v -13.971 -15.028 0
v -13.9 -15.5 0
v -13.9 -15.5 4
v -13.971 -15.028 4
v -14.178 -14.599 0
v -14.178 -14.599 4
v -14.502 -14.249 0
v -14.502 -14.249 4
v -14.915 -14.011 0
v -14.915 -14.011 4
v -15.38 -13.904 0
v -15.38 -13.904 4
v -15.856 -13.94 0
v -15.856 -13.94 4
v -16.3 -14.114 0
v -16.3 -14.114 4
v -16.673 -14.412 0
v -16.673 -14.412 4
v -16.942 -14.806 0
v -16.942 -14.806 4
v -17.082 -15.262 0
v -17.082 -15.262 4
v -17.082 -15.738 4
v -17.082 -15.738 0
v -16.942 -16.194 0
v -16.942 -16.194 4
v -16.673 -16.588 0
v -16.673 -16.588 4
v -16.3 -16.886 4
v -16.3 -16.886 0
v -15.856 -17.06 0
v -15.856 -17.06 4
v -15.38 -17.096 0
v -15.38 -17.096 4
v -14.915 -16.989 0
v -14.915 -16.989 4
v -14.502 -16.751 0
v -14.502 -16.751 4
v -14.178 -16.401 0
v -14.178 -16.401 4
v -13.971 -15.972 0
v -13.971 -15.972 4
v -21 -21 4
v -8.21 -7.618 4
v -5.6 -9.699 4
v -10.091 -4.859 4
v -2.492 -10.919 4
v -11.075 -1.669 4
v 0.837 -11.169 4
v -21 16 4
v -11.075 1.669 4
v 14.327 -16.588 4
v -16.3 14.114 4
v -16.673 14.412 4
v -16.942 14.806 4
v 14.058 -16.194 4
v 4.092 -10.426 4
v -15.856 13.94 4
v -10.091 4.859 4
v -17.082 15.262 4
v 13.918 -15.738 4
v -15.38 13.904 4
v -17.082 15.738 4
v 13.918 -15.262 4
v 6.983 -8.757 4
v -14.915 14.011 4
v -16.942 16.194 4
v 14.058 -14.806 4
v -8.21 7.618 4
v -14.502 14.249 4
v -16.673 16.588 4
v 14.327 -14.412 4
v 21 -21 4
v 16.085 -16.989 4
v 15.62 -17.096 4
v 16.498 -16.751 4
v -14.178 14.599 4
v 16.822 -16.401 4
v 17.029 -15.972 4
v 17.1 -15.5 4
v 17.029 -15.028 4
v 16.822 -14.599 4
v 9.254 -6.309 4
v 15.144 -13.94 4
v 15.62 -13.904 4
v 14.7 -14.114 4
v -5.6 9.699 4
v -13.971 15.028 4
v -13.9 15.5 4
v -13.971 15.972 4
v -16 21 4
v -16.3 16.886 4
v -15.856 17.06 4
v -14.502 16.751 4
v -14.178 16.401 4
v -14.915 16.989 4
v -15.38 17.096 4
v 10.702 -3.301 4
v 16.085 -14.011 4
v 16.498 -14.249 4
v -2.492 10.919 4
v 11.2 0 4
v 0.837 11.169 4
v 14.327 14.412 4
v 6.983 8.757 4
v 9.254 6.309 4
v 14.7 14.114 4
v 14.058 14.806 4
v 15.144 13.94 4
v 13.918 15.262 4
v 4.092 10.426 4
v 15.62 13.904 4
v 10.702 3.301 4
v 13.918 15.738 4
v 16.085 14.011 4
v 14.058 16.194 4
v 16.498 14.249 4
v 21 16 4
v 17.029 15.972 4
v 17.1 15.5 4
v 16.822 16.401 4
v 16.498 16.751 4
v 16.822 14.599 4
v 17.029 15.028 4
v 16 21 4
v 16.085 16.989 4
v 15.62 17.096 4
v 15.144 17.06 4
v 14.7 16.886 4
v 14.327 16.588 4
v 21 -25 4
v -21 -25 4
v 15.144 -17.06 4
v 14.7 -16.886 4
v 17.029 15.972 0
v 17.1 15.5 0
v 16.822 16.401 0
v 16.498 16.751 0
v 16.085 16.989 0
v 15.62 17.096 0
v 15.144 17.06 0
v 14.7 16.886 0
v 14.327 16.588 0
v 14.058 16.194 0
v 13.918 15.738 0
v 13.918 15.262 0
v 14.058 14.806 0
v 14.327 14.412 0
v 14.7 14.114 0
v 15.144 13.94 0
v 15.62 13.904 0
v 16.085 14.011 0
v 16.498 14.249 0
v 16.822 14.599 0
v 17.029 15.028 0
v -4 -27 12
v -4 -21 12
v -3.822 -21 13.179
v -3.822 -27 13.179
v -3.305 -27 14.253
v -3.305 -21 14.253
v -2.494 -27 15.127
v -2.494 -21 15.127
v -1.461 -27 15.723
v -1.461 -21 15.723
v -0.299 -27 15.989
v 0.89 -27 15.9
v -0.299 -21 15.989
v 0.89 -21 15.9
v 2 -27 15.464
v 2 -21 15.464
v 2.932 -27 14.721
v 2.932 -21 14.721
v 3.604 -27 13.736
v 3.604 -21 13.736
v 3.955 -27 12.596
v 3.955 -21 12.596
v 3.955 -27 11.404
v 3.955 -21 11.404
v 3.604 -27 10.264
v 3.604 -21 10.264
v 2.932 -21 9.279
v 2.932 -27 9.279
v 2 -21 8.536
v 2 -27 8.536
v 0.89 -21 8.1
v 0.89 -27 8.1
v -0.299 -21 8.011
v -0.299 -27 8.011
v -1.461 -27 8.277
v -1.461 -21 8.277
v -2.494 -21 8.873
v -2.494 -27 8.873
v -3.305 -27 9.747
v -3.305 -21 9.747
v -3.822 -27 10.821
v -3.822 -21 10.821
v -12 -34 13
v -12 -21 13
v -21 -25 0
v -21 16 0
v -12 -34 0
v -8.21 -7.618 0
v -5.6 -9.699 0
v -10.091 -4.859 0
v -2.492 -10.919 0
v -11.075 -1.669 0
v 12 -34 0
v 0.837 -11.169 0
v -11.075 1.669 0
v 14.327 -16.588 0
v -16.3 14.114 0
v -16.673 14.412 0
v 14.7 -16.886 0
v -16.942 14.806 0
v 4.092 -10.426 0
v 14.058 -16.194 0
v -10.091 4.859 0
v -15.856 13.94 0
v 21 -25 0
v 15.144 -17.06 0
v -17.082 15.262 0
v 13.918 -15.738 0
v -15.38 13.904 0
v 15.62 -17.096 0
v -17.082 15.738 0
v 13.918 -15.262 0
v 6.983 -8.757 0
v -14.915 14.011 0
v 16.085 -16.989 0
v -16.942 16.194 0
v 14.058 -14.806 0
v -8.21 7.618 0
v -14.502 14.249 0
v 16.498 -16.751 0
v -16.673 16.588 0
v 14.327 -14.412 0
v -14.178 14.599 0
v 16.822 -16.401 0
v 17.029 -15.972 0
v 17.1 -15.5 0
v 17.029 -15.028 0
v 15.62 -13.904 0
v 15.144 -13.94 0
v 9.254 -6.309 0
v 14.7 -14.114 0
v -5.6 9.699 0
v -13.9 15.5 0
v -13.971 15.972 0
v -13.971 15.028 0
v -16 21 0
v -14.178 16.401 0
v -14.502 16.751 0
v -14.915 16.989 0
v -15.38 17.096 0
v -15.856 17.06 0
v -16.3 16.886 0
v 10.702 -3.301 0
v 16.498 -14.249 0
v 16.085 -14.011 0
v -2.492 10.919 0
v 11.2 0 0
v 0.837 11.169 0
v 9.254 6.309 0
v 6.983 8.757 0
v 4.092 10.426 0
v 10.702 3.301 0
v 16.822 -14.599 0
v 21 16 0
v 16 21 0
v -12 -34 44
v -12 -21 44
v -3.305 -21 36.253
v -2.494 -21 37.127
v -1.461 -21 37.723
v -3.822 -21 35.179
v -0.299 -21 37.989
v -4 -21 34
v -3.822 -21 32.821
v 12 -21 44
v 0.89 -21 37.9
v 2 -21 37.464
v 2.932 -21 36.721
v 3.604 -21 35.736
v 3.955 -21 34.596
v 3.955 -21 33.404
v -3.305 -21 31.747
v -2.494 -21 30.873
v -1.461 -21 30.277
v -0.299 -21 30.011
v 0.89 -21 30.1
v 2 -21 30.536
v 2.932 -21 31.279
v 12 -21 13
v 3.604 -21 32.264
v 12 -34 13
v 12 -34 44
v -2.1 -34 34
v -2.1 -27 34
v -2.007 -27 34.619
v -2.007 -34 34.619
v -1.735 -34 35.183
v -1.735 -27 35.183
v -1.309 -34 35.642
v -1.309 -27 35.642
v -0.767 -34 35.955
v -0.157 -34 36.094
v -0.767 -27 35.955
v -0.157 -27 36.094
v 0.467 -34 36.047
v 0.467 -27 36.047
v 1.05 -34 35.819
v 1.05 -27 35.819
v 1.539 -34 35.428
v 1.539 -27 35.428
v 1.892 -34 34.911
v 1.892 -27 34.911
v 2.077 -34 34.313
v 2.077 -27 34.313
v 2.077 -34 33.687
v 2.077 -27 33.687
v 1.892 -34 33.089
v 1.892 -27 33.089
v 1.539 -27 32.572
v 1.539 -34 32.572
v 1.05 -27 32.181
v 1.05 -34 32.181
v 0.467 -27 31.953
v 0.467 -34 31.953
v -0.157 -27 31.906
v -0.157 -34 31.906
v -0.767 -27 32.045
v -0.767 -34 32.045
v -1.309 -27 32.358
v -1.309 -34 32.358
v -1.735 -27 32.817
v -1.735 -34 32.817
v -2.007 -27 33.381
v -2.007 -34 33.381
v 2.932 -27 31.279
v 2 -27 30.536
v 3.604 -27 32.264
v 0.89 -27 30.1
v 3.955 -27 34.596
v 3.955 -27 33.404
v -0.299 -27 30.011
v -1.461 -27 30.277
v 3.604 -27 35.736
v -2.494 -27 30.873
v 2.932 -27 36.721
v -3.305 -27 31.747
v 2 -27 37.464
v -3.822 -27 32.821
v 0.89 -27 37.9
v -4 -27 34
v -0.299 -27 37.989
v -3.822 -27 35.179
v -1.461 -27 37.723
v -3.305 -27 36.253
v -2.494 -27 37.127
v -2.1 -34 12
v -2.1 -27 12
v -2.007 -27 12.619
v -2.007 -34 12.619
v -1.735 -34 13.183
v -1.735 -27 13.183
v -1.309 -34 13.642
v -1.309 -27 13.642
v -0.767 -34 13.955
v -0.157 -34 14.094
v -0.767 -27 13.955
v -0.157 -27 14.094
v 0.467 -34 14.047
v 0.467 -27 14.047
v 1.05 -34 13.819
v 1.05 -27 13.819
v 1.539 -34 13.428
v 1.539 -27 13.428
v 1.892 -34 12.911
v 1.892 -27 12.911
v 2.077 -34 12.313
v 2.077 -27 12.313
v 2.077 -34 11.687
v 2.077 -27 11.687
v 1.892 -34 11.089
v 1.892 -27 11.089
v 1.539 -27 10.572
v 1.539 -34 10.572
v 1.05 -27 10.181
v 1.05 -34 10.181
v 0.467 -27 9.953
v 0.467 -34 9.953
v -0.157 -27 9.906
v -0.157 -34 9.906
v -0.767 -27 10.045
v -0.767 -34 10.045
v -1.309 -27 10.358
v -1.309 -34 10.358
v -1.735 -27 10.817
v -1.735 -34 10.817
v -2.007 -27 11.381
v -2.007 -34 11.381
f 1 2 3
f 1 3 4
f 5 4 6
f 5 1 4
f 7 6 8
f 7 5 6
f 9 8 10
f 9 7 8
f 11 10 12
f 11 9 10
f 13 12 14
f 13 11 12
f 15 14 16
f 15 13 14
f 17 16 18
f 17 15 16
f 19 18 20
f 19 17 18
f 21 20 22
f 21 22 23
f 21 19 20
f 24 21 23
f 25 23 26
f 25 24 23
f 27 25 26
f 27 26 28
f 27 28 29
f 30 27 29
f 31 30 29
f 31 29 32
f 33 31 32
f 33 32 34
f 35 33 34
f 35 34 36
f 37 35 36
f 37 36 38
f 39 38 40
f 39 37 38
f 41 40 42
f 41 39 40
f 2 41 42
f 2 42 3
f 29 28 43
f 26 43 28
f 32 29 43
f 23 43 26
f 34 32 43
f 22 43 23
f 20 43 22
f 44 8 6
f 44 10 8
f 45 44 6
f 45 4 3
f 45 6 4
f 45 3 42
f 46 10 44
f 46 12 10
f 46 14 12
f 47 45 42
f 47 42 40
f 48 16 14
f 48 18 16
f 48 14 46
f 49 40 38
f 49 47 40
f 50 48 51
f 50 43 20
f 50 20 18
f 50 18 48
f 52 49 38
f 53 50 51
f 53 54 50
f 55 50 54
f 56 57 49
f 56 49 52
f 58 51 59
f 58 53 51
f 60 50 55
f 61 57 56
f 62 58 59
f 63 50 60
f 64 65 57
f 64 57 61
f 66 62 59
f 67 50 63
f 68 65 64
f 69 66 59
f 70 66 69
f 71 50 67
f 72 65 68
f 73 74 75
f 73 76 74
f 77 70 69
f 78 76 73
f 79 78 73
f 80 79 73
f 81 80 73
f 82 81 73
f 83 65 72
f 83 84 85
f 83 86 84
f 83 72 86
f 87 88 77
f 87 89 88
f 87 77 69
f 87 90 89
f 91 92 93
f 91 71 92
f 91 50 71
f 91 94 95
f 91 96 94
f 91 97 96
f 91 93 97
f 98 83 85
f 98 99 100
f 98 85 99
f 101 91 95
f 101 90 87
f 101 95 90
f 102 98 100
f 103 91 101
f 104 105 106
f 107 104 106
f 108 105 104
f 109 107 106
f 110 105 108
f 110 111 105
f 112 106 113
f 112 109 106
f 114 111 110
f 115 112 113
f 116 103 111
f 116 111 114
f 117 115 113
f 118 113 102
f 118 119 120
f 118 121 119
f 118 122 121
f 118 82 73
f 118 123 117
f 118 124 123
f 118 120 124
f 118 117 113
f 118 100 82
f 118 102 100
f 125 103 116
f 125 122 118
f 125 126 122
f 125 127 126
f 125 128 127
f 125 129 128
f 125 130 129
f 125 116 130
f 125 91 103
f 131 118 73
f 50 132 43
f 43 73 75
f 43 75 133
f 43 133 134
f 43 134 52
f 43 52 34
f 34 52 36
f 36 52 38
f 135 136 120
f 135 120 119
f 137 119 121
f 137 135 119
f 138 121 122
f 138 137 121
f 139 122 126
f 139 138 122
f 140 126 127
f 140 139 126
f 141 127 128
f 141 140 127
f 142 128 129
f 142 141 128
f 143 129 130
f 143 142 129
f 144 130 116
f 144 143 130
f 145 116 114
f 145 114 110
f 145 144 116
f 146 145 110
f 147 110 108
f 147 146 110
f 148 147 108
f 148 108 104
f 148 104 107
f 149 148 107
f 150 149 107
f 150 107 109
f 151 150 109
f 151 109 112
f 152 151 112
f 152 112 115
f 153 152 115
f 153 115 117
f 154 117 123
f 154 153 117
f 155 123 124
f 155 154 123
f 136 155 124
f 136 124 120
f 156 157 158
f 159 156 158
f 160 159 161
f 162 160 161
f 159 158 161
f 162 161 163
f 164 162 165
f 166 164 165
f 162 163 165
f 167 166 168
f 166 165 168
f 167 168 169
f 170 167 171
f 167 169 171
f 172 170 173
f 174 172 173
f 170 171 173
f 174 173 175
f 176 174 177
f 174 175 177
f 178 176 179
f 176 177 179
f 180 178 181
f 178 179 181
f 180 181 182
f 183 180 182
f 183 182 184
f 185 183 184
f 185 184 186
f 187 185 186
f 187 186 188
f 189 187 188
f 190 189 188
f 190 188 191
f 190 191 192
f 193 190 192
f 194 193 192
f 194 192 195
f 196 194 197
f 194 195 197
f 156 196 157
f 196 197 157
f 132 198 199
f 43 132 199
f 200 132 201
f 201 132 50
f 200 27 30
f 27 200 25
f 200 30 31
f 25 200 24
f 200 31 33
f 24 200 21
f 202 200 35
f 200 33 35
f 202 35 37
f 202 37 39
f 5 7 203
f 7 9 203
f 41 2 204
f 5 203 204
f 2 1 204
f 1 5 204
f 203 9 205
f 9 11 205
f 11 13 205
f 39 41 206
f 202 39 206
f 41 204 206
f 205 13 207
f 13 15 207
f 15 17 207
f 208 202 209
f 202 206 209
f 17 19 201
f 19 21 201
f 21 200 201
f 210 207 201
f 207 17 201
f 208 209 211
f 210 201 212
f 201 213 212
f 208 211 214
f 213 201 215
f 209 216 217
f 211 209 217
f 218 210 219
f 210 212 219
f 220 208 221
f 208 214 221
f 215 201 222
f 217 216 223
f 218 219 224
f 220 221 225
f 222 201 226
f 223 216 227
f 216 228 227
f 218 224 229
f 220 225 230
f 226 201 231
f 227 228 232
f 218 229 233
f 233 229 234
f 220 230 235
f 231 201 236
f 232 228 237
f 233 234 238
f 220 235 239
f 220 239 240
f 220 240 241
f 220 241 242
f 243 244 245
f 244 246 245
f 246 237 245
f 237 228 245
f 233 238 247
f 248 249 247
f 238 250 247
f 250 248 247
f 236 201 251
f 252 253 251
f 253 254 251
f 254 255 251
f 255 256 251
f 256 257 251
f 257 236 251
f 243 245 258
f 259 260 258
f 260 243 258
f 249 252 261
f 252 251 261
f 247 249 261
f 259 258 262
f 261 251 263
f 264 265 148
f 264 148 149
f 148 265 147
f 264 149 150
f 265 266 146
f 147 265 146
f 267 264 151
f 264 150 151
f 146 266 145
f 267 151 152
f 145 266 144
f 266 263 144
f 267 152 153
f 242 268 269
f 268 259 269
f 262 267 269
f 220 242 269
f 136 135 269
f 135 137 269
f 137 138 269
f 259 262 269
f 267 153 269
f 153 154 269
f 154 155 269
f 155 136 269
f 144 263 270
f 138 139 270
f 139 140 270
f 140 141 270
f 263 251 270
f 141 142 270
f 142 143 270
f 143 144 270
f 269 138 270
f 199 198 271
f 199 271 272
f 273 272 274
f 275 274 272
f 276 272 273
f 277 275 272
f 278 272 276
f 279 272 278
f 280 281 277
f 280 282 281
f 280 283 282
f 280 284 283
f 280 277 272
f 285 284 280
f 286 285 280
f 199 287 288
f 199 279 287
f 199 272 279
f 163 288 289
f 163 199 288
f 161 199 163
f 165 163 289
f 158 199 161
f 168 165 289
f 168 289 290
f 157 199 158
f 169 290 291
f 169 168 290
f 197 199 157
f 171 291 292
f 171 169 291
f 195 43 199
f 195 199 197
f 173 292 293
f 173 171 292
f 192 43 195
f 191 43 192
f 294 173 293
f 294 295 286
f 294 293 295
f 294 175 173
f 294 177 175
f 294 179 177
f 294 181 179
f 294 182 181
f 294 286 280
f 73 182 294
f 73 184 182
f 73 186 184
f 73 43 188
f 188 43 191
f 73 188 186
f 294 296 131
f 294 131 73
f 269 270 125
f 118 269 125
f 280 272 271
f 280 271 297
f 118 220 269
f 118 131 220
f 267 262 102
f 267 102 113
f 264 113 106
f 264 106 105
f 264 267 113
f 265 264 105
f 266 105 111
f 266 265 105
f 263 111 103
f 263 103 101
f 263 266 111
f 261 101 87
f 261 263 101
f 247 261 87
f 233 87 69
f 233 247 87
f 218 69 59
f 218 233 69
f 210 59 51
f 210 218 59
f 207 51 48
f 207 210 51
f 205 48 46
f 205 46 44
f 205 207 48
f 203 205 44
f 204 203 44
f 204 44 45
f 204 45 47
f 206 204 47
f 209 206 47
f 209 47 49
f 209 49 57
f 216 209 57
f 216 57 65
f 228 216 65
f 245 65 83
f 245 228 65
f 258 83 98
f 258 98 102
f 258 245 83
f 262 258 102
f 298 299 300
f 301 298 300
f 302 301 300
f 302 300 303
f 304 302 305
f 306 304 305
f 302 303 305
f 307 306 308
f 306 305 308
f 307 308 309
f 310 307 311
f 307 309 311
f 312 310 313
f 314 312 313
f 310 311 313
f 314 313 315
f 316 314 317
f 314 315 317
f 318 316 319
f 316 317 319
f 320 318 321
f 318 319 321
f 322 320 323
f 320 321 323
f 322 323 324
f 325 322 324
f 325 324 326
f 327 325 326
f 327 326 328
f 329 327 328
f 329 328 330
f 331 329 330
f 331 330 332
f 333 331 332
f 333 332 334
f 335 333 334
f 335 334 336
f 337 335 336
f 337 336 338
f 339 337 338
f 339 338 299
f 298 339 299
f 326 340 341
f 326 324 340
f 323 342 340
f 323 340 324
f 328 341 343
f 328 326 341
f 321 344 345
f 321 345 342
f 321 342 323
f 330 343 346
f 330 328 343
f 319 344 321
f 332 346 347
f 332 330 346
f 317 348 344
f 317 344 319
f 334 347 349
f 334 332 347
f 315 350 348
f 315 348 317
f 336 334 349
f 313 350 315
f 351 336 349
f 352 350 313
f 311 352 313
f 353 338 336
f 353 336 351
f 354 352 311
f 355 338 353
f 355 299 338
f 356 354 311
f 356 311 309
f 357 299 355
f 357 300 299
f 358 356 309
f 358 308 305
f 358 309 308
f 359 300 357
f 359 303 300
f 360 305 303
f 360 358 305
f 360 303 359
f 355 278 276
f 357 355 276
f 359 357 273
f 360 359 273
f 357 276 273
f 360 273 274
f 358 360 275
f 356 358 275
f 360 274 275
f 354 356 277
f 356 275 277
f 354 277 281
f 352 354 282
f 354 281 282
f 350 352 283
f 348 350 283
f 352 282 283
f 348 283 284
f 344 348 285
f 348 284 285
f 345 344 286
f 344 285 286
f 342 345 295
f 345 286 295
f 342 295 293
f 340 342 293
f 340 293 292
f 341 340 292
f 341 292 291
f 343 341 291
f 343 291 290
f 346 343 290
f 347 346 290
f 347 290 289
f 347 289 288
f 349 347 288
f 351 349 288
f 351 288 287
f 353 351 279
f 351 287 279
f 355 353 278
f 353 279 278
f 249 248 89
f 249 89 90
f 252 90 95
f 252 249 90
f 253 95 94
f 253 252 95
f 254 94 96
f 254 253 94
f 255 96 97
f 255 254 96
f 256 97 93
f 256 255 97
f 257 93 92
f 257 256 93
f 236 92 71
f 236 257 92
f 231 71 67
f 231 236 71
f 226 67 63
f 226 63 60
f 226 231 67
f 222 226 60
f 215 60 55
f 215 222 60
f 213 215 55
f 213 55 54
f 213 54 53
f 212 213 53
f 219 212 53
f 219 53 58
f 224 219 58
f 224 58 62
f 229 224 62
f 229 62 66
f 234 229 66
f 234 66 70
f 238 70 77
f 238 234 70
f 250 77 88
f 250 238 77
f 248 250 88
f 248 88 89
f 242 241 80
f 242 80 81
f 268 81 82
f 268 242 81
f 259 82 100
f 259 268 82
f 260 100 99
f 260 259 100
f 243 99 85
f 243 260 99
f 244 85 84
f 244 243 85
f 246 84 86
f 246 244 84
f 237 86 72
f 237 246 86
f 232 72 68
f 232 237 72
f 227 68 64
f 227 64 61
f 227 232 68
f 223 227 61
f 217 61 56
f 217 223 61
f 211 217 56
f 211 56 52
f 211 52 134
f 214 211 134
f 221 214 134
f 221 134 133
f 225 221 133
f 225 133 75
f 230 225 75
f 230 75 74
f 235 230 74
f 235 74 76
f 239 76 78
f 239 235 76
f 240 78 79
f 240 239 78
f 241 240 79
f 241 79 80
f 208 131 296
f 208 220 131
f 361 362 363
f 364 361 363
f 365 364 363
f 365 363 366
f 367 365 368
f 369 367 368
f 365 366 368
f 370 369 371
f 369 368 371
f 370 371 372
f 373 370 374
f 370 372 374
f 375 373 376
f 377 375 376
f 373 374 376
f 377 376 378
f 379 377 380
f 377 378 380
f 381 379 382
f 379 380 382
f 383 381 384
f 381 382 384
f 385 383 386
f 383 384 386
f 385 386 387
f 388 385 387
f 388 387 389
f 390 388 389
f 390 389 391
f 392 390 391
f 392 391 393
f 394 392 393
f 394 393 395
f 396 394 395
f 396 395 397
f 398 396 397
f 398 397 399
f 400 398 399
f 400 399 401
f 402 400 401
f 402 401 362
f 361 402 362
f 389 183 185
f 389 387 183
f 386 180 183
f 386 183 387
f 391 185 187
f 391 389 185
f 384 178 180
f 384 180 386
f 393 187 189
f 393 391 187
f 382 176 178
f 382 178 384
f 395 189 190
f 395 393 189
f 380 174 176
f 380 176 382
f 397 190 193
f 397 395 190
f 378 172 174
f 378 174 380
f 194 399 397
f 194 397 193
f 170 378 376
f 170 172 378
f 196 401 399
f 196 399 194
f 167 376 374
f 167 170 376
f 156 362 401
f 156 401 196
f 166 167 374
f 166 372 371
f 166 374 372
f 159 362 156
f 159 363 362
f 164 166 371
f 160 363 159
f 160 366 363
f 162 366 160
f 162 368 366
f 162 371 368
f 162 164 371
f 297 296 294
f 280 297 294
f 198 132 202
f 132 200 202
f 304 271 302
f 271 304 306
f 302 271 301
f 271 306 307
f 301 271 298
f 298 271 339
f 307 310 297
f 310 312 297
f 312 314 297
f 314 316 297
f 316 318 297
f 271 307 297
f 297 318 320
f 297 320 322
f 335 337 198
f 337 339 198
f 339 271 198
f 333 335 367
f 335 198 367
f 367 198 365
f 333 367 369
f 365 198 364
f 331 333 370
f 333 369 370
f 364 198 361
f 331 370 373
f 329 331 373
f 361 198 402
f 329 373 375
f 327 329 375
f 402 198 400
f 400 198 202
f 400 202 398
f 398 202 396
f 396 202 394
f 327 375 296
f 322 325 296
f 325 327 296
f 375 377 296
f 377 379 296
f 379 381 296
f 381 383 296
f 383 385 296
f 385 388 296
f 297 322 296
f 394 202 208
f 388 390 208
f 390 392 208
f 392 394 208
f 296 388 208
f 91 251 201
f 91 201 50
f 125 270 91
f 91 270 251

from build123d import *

# Parameters (mm, degrees)
F0_R        = 1.6
F0_R_2      = 11.2
F0_W        = 24
F0_H        = 13
F1_DEPTH    = 4
F2_W        = 24
F2_H        = 13
F3_DEPTH    = 40
F4_T4_DEPTH = 4
F4_T9_DEPTH = 4
F5_SIZE     = 8.99999
F6_R        = 2.1
F7_DEPTH    = 25
F6_R_2      = 4
F8_DEPTH    = 6
F9_SIZE     = 5


# Not quite as in the source:
# - a fillet or chamfer that OpenCascade refuses, or shapes differently, is made with other operations: its cross-section is extruded or revolved along the edge and cut away or added
# - a fillet or chamfer is up to 0.001 mm smaller than in the source, because OpenCascade refuses the exact size


with BuildPart() as f1:
    # F0 (on Top) → F1 (new body)
    with BuildSketch(Plane.XY):
        Polygon((12, -21), (21, -21), (21, 21), (-21, 21), (-21, -21), (-12, -21), align=None)
        with Locations((-15.5, -15.5)):
            Circle(F0_R, mode=Mode.SUBTRACT)
        with Locations((15.5, -15.5)):
            Circle(F0_R, mode=Mode.SUBTRACT)
        with Locations((-15.5, 15.5)):
            Circle(F0_R, mode=Mode.SUBTRACT)
        Circle(F0_R_2, mode=Mode.SUBTRACT)
        with Locations((15.5, 15.5)):
            Circle(F0_R, mode=Mode.SUBTRACT)
        with Locations((0, -27.5)):
            Rectangle(F0_W, F0_H)
    extrude(amount=F1_DEPTH)

    # F2 (on face) → F3 (join)
    with BuildSketch(Plane.XY.offset(4)):
        with Locations((0, -27.5)):
            Rectangle(F2_W, F2_H)
    extrude(amount=F3_DEPTH)

    # F4: chamfer of 13 on 2 edges, made by hand


with BuildPart() as f4_tool2:
    # F4_s3 → F4_t4 (new body)
    with BuildSketch(Plane.XY):
        Polygon((25, -21), (12, -34), (12, -21), align=None)
    extrude(amount=F4_T4_DEPTH)

    split(bisect_by=Plane.YZ.offset(21), keep=Keep.BOTTOM)


with BuildPart() as f1_1:
    add(f1.part)

    # F4_t1: union F4_tool2
    add(f4_tool2.part)


with BuildPart() as f4_tool7:
    # F4_s8 → F4_t9 (new body)
    with BuildSketch(Plane.XY):
        Polygon((-25, -21), (-12, -34), (-12, -21), align=None)
    extrude(amount=F4_T9_DEPTH)

    split(bisect_by=Plane.YZ.offset(-21), keep=Keep.TOP)


with BuildPart() as f1_2:
    add(f1_1.part)

    # F4_t6: union F4_tool7
    add(f4_tool7.part)

    # F5 (size 9 in the source; OpenCascade refuses exactly that, so slightly less here)
    f5_edges = [f1_2.edges().sort_by_distance(p)[0] for p in [
        (12, -27.5, 4),
        (-12, -27.5, 4),
    ]]
    chamfer(f5_edges, length=F5_SIZE)

    # F6 (on face) → F7 (cut)
    with BuildSketch(Plane(origin=(0, -21, 0), x_dir=(-1, 0, 0), z_dir=(0, 1, 0))):
        with Locations((0, 34)):
            Circle(F6_R)
        with Locations((0, 12)):
            Circle(F6_R)
    extrude(amount=-F7_DEPTH, mode=Mode.SUBTRACT)

    # F6 (on face) → F8 (cut)
    with BuildSketch(Plane(origin=(0, -21, 0), x_dir=(-1, 0, 0), z_dir=(0, 1, 0))):
        with Locations((0, 34)):
            Circle(F6_R_2)
        with Locations((0, 34)):
            Circle(F6_R, mode=Mode.SUBTRACT)
        with Locations((0, 12)):
            Circle(F6_R_2)
        with Locations((0, 12)):
            Circle(F6_R, mode=Mode.SUBTRACT)
    extrude(amount=-F8_DEPTH, mode=Mode.SUBTRACT)

    # F9
    f9_edges = [f1_2.edges().sort_by_distance(p)[0] for p in [
        (21, 21, 2),
        (-21, 21, 2),
    ]]
    chamfer(f9_edges, length=F9_SIZE)


solid = f1_2.part
